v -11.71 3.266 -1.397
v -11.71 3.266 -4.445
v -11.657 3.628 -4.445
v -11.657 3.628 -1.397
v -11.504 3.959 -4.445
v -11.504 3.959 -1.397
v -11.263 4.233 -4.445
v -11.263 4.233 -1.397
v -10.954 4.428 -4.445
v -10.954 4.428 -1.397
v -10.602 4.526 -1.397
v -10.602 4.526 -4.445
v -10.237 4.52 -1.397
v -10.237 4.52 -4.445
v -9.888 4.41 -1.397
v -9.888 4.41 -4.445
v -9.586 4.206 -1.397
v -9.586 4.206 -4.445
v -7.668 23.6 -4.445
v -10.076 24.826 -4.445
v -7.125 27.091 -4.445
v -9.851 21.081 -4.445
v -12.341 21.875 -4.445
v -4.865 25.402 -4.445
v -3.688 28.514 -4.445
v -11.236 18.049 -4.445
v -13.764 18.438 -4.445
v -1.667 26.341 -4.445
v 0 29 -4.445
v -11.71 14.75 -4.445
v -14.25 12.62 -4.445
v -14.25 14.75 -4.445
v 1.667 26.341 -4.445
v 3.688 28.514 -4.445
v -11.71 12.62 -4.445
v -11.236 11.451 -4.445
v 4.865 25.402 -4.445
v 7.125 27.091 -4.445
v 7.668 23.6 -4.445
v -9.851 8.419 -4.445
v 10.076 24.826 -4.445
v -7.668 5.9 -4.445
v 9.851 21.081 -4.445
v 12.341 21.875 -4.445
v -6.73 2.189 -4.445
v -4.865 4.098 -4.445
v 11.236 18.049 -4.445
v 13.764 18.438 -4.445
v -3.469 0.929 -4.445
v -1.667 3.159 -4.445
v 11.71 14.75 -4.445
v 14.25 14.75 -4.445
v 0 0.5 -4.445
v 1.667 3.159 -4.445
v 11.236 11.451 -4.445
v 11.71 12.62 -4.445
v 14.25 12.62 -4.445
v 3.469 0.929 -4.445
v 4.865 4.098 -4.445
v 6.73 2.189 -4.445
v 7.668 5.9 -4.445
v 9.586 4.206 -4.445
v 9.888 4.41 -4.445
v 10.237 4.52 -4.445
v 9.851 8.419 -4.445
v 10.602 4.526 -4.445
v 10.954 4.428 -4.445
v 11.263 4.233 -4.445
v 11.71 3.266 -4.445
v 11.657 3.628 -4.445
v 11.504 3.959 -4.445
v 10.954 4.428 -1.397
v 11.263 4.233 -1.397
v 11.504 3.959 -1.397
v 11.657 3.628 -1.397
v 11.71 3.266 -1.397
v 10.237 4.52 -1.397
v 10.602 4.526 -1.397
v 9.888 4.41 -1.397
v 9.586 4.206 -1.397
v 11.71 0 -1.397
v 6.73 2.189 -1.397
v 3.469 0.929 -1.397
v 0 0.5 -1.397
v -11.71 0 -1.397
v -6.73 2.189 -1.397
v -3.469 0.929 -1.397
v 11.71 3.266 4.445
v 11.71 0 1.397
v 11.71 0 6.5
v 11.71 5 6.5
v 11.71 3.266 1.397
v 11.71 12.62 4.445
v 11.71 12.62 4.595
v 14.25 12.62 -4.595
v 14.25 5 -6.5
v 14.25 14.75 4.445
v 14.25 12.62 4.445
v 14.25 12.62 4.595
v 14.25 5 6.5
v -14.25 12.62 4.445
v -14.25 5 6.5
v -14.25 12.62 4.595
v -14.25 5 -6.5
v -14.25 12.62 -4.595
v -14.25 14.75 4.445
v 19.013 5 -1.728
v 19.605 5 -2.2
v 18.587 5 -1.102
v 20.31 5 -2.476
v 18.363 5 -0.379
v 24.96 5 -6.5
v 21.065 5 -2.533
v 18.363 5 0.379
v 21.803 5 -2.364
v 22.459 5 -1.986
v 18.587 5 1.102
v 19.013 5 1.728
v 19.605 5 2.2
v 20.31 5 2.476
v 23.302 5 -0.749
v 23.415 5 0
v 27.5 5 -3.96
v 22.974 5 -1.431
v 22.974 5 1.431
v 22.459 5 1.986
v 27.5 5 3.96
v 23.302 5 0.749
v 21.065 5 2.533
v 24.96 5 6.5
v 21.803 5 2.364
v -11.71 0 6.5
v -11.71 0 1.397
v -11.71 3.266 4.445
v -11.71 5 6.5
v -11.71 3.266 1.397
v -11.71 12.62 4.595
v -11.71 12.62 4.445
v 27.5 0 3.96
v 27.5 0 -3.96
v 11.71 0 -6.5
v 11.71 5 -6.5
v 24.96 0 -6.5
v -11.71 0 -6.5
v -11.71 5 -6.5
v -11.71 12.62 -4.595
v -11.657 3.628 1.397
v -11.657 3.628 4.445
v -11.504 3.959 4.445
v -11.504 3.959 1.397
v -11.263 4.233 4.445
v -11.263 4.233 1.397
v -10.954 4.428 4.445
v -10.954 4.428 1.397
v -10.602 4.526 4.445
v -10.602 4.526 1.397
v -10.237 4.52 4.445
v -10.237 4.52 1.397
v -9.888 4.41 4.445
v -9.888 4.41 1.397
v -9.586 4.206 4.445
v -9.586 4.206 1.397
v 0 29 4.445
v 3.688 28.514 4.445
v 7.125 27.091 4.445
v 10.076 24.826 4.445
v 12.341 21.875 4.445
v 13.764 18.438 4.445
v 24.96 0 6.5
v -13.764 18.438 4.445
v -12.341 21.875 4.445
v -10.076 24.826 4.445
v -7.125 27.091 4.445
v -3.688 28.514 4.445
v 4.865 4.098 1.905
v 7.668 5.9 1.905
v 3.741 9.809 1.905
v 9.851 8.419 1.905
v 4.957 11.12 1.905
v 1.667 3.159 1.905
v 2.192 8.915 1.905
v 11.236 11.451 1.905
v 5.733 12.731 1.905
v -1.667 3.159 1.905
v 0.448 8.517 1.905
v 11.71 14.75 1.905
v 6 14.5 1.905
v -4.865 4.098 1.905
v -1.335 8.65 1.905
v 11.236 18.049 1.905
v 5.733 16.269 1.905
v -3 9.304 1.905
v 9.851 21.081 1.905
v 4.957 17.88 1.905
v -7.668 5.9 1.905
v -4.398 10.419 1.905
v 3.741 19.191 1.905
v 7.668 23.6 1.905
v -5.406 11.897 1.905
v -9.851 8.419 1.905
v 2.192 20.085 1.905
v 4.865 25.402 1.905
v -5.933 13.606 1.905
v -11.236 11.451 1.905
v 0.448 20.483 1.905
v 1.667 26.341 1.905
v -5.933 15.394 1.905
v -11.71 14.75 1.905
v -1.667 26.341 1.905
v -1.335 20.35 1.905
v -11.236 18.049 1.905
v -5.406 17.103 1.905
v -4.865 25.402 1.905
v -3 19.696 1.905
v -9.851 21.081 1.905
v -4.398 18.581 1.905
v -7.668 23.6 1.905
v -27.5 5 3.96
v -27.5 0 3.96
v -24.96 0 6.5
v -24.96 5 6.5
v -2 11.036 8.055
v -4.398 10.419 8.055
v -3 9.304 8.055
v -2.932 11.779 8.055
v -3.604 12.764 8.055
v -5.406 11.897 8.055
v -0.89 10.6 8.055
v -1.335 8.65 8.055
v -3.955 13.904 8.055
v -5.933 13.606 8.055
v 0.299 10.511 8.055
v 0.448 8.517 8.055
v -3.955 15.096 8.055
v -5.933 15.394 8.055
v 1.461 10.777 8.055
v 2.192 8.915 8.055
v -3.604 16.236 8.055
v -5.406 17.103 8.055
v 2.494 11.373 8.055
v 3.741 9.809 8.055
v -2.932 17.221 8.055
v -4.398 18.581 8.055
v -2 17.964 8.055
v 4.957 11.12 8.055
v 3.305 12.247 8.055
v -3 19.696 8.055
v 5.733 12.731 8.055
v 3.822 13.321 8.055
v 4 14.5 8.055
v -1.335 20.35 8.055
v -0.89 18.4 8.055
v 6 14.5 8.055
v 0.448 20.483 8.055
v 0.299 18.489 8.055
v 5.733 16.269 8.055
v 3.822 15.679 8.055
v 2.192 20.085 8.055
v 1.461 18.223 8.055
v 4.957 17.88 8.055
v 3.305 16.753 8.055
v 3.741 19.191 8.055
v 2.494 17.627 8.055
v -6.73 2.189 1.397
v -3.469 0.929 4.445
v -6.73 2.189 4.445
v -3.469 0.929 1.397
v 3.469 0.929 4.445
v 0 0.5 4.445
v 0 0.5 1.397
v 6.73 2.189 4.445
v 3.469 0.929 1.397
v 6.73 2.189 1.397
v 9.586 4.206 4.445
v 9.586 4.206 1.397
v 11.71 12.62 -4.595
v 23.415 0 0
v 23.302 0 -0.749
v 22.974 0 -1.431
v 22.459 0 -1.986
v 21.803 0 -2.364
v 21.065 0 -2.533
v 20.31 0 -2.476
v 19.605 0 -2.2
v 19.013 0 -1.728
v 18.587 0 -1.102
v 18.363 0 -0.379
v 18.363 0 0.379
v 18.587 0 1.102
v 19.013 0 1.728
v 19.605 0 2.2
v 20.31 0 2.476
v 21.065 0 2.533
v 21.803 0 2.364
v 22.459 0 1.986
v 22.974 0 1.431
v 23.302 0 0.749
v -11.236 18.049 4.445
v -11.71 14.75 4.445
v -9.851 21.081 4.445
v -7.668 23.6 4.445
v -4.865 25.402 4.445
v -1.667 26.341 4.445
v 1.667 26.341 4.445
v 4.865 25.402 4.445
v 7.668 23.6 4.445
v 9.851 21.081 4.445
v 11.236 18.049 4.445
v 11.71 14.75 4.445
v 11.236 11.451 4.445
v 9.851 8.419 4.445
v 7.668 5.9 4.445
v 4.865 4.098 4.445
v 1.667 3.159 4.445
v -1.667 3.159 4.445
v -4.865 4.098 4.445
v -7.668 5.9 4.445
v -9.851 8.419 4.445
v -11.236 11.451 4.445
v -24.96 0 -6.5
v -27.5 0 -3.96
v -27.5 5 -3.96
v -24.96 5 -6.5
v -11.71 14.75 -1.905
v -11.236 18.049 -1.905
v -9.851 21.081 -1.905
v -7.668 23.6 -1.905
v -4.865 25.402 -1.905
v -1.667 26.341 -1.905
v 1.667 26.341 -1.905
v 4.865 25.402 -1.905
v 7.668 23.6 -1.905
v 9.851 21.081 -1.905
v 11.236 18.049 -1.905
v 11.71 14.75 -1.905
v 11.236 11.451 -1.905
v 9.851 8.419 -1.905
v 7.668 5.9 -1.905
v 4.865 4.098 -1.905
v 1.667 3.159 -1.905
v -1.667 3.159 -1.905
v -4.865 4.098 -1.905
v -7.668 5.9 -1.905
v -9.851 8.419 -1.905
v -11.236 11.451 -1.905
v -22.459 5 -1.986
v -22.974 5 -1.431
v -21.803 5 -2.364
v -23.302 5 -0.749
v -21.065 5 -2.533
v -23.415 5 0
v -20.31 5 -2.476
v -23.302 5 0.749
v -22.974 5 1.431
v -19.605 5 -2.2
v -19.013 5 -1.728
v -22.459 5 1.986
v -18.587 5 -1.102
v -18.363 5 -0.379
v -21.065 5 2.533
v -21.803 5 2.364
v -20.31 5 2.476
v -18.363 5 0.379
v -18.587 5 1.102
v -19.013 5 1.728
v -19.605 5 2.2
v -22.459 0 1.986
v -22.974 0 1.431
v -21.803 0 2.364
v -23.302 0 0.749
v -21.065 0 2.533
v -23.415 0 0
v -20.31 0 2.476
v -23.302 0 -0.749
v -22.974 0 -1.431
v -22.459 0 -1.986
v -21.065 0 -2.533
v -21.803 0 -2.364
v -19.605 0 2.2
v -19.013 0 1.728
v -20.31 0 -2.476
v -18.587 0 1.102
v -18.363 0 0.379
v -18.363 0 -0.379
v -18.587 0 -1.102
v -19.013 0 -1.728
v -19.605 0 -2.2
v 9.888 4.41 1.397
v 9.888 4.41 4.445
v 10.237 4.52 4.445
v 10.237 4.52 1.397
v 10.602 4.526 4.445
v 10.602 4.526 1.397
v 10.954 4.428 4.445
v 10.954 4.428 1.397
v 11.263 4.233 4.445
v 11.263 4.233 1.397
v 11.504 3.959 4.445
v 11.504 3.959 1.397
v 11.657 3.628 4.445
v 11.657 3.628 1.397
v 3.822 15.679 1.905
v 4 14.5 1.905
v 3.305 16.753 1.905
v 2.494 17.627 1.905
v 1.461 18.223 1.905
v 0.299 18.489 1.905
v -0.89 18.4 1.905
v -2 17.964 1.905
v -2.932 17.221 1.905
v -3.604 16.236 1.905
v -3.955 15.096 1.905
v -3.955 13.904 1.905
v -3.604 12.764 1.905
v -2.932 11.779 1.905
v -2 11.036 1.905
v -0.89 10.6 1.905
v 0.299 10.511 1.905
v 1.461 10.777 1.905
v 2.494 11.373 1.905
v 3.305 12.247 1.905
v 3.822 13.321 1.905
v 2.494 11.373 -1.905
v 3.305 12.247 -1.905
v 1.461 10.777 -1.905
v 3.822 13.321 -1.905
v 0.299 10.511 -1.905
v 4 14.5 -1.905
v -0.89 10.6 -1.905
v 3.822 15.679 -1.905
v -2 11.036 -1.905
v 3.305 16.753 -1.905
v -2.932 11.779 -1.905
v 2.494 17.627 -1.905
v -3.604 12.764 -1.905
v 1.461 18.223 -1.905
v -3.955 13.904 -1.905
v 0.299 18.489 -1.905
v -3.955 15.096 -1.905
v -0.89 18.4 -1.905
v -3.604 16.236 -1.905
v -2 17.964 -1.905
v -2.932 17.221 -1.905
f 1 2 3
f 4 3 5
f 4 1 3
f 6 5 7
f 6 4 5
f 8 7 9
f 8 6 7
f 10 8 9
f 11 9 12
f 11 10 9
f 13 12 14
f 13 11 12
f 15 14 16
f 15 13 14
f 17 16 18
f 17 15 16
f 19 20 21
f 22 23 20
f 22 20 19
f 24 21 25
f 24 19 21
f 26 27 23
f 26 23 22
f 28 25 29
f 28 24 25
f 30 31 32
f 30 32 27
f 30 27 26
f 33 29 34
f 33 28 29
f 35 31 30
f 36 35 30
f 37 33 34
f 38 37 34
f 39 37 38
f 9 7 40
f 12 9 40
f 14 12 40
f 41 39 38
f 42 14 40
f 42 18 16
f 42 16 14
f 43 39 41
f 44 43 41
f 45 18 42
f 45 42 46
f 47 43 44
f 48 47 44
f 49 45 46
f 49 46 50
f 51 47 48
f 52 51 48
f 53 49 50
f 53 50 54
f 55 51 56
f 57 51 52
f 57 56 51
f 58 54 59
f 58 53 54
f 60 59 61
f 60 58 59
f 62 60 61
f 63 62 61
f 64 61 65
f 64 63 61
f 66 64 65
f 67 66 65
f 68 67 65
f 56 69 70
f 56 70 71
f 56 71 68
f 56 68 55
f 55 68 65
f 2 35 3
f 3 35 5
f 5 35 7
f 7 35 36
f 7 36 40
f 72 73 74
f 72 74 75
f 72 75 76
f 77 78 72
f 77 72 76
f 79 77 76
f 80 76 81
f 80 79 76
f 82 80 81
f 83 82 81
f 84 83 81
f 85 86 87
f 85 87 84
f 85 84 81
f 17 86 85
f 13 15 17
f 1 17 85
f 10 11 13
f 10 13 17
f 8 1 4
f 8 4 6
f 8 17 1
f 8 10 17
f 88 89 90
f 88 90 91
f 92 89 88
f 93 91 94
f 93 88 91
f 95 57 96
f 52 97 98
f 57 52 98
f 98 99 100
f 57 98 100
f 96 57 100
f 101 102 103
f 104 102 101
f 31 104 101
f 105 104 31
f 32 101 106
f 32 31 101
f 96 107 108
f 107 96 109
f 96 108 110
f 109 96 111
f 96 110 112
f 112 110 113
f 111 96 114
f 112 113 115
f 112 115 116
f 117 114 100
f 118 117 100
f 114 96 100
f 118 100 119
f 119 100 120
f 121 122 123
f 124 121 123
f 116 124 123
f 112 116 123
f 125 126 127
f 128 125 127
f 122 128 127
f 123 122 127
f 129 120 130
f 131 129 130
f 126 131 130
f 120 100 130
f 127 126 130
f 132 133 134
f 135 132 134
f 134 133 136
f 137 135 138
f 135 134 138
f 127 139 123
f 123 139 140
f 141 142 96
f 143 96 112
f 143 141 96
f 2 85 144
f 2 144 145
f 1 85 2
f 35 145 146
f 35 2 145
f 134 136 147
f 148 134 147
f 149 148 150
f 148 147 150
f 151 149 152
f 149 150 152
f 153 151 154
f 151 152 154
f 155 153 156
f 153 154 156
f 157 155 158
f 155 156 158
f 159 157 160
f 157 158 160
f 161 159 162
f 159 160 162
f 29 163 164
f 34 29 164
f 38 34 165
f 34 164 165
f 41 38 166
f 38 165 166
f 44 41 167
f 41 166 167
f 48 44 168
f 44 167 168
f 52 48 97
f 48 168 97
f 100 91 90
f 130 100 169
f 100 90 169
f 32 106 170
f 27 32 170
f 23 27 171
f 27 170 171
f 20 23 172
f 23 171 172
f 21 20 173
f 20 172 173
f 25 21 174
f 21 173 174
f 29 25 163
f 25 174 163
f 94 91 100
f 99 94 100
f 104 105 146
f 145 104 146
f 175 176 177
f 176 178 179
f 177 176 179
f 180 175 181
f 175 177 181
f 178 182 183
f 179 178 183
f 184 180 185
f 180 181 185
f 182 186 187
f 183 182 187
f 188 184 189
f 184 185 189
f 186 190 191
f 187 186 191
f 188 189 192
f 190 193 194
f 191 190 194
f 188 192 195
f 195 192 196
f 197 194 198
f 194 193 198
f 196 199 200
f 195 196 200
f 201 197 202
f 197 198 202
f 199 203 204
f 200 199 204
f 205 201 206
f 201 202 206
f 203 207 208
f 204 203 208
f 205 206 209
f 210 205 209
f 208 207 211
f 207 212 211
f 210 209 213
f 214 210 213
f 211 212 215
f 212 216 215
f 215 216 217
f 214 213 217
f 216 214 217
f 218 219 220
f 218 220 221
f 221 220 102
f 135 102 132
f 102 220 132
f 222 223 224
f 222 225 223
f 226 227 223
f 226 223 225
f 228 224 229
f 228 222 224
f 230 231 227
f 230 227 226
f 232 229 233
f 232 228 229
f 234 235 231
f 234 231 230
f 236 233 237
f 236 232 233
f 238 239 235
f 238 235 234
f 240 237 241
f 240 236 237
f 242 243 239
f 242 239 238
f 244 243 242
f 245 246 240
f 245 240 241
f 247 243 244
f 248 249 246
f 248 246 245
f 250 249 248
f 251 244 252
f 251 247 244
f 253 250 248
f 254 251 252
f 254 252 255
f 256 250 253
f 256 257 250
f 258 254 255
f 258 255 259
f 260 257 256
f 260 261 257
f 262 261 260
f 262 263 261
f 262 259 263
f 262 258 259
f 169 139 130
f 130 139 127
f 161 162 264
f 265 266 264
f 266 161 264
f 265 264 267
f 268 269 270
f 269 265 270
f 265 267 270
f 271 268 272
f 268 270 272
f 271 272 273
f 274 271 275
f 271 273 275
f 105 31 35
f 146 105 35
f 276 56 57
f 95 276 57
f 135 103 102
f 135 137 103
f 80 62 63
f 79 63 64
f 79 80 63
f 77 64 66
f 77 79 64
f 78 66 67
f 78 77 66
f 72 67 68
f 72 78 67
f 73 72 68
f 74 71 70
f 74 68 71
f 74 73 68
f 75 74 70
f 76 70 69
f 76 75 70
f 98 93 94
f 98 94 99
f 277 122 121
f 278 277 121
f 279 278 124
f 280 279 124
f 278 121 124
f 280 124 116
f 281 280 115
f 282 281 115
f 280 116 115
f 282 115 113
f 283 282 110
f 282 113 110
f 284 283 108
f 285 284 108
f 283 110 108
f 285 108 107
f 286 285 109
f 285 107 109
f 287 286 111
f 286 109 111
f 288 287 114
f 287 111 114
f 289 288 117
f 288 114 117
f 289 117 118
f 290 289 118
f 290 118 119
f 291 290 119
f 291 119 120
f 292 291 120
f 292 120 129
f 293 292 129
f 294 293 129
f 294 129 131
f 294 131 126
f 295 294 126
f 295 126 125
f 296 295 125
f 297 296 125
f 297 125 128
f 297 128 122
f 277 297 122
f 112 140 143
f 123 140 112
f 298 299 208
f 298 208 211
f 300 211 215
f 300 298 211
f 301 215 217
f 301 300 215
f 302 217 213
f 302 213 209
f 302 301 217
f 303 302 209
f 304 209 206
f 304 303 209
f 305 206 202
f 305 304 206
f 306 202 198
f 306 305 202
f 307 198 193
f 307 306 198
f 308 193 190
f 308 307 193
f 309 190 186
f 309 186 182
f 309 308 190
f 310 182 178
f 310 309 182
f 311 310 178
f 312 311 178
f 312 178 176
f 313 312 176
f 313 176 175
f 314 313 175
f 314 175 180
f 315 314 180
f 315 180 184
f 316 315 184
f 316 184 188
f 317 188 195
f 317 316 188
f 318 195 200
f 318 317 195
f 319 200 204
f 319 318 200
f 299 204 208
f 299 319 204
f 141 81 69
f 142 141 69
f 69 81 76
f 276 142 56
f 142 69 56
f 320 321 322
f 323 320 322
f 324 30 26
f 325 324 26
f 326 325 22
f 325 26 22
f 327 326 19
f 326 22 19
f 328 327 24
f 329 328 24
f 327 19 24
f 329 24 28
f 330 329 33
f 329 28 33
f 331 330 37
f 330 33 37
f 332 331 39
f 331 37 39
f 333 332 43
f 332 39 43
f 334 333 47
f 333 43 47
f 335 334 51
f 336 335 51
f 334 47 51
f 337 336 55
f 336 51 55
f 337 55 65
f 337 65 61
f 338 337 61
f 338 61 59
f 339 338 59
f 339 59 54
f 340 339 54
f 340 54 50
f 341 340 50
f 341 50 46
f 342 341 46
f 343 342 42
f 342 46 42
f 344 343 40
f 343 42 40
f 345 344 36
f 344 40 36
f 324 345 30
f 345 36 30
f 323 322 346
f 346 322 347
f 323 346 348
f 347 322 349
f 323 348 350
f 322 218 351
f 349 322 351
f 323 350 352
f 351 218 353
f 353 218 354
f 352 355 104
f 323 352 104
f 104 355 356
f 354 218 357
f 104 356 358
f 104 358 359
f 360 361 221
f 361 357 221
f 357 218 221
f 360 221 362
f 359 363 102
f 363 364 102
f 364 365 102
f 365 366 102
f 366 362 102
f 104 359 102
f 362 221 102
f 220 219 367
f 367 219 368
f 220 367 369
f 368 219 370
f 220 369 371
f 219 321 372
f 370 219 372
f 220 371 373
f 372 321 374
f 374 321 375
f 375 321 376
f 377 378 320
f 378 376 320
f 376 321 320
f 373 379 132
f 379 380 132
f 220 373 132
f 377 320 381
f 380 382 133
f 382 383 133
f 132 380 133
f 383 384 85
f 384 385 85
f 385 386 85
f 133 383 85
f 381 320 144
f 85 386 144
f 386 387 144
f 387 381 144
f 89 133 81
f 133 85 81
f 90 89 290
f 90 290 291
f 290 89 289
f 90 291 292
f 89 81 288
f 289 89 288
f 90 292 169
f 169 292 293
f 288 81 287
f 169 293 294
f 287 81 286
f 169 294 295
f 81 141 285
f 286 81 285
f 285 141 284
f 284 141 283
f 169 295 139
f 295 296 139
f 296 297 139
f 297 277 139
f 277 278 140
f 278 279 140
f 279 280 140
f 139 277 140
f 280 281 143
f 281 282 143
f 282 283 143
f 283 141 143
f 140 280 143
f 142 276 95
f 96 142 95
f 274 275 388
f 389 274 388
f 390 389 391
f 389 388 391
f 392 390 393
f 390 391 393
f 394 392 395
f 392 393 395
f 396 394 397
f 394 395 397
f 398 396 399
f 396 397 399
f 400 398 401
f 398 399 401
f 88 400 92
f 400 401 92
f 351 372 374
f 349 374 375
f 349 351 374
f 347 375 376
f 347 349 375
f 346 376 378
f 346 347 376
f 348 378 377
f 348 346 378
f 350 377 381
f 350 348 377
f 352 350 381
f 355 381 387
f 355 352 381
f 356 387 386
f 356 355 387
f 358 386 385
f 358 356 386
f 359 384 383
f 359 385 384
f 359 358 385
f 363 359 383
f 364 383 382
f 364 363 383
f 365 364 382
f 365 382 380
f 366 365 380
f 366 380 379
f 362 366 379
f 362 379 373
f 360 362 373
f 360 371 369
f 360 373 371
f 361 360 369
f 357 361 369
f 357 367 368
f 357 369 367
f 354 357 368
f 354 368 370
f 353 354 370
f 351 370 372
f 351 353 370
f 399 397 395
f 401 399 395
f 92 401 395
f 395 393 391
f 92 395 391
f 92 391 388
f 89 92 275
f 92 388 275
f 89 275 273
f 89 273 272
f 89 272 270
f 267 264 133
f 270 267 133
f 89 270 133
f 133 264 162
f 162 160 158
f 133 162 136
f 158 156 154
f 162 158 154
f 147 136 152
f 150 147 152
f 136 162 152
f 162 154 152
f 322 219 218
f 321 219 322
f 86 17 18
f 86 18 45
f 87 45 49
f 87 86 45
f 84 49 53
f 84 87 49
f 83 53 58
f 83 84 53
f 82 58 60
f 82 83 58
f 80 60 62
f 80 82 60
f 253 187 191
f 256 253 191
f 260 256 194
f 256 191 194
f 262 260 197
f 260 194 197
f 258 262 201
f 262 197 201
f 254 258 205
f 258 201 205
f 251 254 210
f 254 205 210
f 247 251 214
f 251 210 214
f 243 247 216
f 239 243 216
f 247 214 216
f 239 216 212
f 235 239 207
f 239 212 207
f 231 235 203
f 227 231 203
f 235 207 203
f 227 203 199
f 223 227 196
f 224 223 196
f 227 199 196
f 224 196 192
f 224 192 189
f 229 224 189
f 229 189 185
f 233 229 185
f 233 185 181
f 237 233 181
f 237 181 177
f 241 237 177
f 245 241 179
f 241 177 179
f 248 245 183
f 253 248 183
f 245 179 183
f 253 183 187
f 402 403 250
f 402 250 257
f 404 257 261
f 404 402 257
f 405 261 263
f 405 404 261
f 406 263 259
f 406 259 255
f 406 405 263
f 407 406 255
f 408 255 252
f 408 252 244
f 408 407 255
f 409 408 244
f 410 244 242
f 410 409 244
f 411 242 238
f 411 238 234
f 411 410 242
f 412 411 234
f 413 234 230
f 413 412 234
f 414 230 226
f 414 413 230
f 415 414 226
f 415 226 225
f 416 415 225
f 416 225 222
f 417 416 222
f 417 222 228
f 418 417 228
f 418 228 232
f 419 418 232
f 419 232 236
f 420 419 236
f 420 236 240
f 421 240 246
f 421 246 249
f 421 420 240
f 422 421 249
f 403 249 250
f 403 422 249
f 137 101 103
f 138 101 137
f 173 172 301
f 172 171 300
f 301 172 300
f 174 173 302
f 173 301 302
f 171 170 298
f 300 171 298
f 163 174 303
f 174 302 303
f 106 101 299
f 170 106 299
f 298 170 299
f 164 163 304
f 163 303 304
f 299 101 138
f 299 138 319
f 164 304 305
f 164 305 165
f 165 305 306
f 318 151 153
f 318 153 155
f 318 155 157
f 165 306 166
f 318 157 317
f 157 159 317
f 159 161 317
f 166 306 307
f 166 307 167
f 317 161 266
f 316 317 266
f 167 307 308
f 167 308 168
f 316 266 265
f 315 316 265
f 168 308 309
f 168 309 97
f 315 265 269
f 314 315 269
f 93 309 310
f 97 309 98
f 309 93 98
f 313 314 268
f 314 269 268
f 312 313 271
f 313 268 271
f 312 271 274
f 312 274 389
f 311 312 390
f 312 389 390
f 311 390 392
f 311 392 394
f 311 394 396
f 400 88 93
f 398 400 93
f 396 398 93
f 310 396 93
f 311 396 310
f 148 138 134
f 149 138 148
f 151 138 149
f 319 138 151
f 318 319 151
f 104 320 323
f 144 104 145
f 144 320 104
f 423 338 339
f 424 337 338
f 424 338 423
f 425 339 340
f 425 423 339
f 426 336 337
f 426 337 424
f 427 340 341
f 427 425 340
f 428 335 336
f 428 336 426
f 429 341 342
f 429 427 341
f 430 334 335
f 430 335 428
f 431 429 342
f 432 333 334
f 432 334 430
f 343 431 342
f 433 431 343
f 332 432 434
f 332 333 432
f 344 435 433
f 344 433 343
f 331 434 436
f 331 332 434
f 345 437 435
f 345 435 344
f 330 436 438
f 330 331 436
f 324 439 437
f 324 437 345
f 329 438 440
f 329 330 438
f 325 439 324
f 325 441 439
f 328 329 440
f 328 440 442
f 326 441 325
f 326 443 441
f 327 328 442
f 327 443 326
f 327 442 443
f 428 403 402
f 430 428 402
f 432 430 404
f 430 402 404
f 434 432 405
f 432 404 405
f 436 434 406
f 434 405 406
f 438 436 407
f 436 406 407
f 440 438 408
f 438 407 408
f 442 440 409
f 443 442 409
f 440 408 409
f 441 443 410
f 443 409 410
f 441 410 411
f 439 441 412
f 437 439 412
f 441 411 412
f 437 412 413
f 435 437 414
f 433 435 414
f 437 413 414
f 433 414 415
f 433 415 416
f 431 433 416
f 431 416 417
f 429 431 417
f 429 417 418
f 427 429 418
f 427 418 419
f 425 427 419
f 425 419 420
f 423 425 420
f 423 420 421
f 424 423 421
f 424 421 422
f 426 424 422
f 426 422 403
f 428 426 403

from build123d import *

# Parameters (mm, degrees)
SKETCH1_W                = 55
SKETCH1_H                = 13
BOSS_EXTRUDE1_DEPTH      = 29
CUT_EXTRUDE1_DEPTH       = 14
SKETCH3_OUTSIDE_W        = 69.704
SKETCH3_OUTSIDE_H        = 27.704
SKETCH3_OUTSIDE_W_2      = 28.5
SKETCH3_OUTSIDE_H_2      = 8.89
CUT_EXTRUDE2_DEPTH       = 25
SKETCH5_W                = 2.54
SKETCH5_H                = 7.62
BOSS_EXTRUDE2_DEPTH      = 6.5
BOSS_EXTRUDE2_DEPTH_BACK = 6.5
CHAMFER1_SIZE            = 1.905
CHAMFER1_SIZE2           = 7.62
CHAMFER1_PART_2_SIZE     = 1.905
CHAMFER1_PART_2_SIZE2    = 7.62
CHAMFER2_SIZE            = 7.62
CHAMFER2_SIZE2           = 1.905
CUT_EXTRUDE3_START       = -1.397
CUT_EXTRUDE3_DEPTH       = 6.1030001
CUT_EXTRUDE4_START       = -4.445
SKETCH7_W                = 23.42
SKETCH7_H                = 12.62
CUT_EXTRUDE4_DEPTH       = 3.0550001
SKETCH8_R                = 4
CUT_EXTRUDE5_DEPTH       = 7.5000001
CUT_EXTRUDE5_DEPTH_BACK  = 7.5000001
SKETCH9_R                = 11.71
CUT_EXTRUDE6_DEPTH       = 2.54
CHAMFER3_SIZE            = 2.54
SKETCH10_R               = 2.54
CUT_EXTRUDE7_DEPTH       = 6.0000001
SKETCH11_R               = 6
SKETCH11_R_2             = 4
BOSS_EXTRUDE3_DEPTH      = 6.15


with BuildPart() as part:
    # Sketch1 → Boss-Extrude1 (new body)
    with BuildSketch(Plane(origin=(0, 0, 0), x_dir=(1, 0, 0), z_dir=(0, 1, 0))):
        Rectangle(SKETCH1_W, SKETCH1_H)
    extrude(amount=BOSS_EXTRUDE1_DEPTH)

    # Sketch2 → Cut-Extrude1 (cut, through all)
    with BuildSketch(Plane.XY.offset(6.5)):
        with BuildLine():
            ThreePointArc((-14.25, 14.75), (-10.076271632, 24.826271632), (0, 29))
            Line((0, 29), (-27.5, 29))
            Line((-27.5, 29), (-27.5, 5))
            Line((-27.5, 5), (-14.25, 5))
            Line((-14.25, 5), (-14.25, 14.75))
        make_face()
        with BuildLine():
            Line((14.25, 5), (27.5, 5))
            Line((27.5, 5), (27.5, 29))
            Line((27.5, 29), (0, 29))
            ThreePointArc((0, 29), (10.076271632, 24.826271632), (14.25, 14.75))
            Line((14.25, 14.75), (14.25, 5))
        make_face()
    extrude(amount=-CUT_EXTRUDE1_DEPTH, mode=Mode.SUBTRACT)

    # Sketch3 outside → Cut-Extrude2 (cut, through all)
    with BuildSketch(Plane(origin=(0, 5, 0), x_dir=(1, 0, 0), z_dir=(0, 1, 0))):
        Rectangle(SKETCH3_OUTSIDE_W, SKETCH3_OUTSIDE_H)
        Rectangle(SKETCH3_OUTSIDE_W_2, SKETCH3_OUTSIDE_H_2, mode=Mode.SUBTRACT)
    extrude(amount=CUT_EXTRUDE2_DEPTH, mode=Mode.SUBTRACT)

    # Sketch5 → Boss-Extrude2 (add, two sides)
    with BuildSketch(Plane.XY) as boss_extrude2_sk:
        with Locations((12.98, 8.81)):
            Rectangle(SKETCH5_W, SKETCH5_H)
        with Locations((-12.98, 8.81)):
            Rectangle(SKETCH5_W, SKETCH5_H)
    extrude(amount=BOSS_EXTRUDE2_DEPTH)
    extrude(boss_extrude2_sk.sketch, amount=-BOSS_EXTRUDE2_DEPTH_BACK)

    # Chamfer1
    chamfer1_edges = [part.edges().sort_by_distance(p)[0] for p in [
        (12.98, 12.62, 6.5),
    ]]
    chamfer1_side = [part.faces().sort_by_distance(p)[0] for p in [
        (12.98, 12.62, 5.4725),
    ]]
    chamfer(chamfer1_edges, length=CHAMFER1_SIZE, length2=CHAMFER1_SIZE2, reference=chamfer1_side[0])

    # Chamfer1 part 2
    chamfer1_part_2_edges = [part.edges().sort_by_distance(p)[0] for p in [
        (-12.98, 12.62, 6.5),
    ]]
    chamfer1_part_2_side = [part.faces().sort_by_distance(p)[0] for p in [
        (-12.98, 12.62, 5.4725),
    ]]
    chamfer(chamfer1_part_2_edges, length=CHAMFER1_PART_2_SIZE, length2=CHAMFER1_PART_2_SIZE2, reference=chamfer1_part_2_side[0])

    # Chamfer2
    chamfer2_edges = [part.edges().sort_by_distance(p)[0] for p in [
        (-12.98, 12.62, -6.5),
        (12.98, 12.62, -6.5),
    ]]
    chamfer2_side = [part.faces().sort_by_distance(p)[0] for p in [
        (0, 3.27861046, -6.5),
    ]]
    chamfer(chamfer2_edges, length=CHAMFER2_SIZE, length2=CHAMFER2_SIZE2, reference=chamfer2_side[0])

    # Sketch6 → Cut-Extrude3 (cut, through all)
    with BuildSketch(Plane.XY.offset(CUT_EXTRUDE3_START)):
        with BuildLine():
            Line((11.71, 3.26623755), (11.71, 0))
            Line((11.71, 0), (-11.71, 0))
            Line((-11.71, 0), (-11.71, 3.26623755))
            ThreePointArc((-11.71, 3.26623755), (-10.953777074, 4.427673351), (-9.585695876, 4.205952648))
            ThreePointArc((-9.585695876, 4.205952648), (0, 0.5), (9.585695876, 4.205952648))
            ThreePointArc((9.585695876, 4.205952648), (10.953777074, 4.427673351), (11.71, 3.26623755))
        make_face()
    cut_extrude3 = extrude(amount=-CUT_EXTRUDE3_DEPTH, mode=Mode.SUBTRACT)

    # Sketch7 → Cut-Extrude4 (cut, through all)
    with BuildSketch(Plane.XY.offset(CUT_EXTRUDE4_START)):
        with Locations((0, 6.31)):
            Rectangle(SKETCH7_W, SKETCH7_H)
    cut_extrude4 = extrude(amount=-CUT_EXTRUDE4_DEPTH, mode=Mode.SUBTRACT)

    # Sketch8 → Cut-Extrude5 (cut, two sides)
    with BuildSketch(Plane.XY) as cut_extrude5_sk:
        with Locations((0, 14.5)):
            Circle(SKETCH8_R)
    extrude(amount=CUT_EXTRUDE5_DEPTH, mode=Mode.SUBTRACT)
    extrude(cut_extrude5_sk.sketch, amount=-CUT_EXTRUDE5_DEPTH_BACK, mode=Mode.SUBTRACT)

    # Sketch9 → Cut-Extrude6 (cut)
    with BuildSketch(Plane(origin=(0, 0, -4.445), x_dir=(-1, 0, 0), z_dir=(0, 0, -1))):
        with Locations((0, 14.75)):
            Circle(SKETCH9_R)
    cut_extrude6 = extrude(amount=-CUT_EXTRUDE6_DEPTH, mode=Mode.SUBTRACT)

    # Mirror1: Cut-Extrude3, Cut-Extrude4, Cut-Extrude6 across plane
    add(cut_extrude3.mirror(Plane.XY), mode=Mode.SUBTRACT)
    add(cut_extrude4.mirror(Plane.XY), mode=Mode.SUBTRACT)
    add(cut_extrude6.mirror(Plane.XY), mode=Mode.SUBTRACT)

    # Chamfer3
    chamfer3_edges = [part.edges().sort_by_distance(p)[0] for p in [
        (-27.5, 2.5, 6.5),
        (-27.5, 2.5, -6.5),
        (27.5, 2.5, 6.5),
        (27.5, 2.5, -6.5),
    ]]
    chamfer(chamfer3_edges, length=CHAMFER3_SIZE)

    # Sketch10 → Cut-Extrude7 (cut, through all)
    with BuildSketch(Plane(origin=(0, 5, 0), x_dir=(1, 0, 0), z_dir=(0, 1, 0))):
        with Locations((20.875, 0)):
            Circle(SKETCH10_R)
    cut_extrude7 = extrude(amount=-CUT_EXTRUDE7_DEPTH, mode=Mode.SUBTRACT)

    # Mirror2: Cut-Extrude7 across plane
    add(cut_extrude7.mirror(Plane(origin=(0, 0, 0), x_dir=(0, 0, 1), z_dir=(1, 0, 0))), mode=Mode.SUBTRACT)

    # Sketch11 → Boss-Extrude3 (add)
    with BuildSketch(Plane.XY.offset(1.905)):
        with Locations((0, 14.5)):
            Circle(SKETCH11_R)
        with Locations((0, 14.5)):
            Circle(SKETCH11_R_2, mode=Mode.SUBTRACT)
    extrude(amount=BOSS_EXTRUDE3_DEPTH)


solid = part.part
